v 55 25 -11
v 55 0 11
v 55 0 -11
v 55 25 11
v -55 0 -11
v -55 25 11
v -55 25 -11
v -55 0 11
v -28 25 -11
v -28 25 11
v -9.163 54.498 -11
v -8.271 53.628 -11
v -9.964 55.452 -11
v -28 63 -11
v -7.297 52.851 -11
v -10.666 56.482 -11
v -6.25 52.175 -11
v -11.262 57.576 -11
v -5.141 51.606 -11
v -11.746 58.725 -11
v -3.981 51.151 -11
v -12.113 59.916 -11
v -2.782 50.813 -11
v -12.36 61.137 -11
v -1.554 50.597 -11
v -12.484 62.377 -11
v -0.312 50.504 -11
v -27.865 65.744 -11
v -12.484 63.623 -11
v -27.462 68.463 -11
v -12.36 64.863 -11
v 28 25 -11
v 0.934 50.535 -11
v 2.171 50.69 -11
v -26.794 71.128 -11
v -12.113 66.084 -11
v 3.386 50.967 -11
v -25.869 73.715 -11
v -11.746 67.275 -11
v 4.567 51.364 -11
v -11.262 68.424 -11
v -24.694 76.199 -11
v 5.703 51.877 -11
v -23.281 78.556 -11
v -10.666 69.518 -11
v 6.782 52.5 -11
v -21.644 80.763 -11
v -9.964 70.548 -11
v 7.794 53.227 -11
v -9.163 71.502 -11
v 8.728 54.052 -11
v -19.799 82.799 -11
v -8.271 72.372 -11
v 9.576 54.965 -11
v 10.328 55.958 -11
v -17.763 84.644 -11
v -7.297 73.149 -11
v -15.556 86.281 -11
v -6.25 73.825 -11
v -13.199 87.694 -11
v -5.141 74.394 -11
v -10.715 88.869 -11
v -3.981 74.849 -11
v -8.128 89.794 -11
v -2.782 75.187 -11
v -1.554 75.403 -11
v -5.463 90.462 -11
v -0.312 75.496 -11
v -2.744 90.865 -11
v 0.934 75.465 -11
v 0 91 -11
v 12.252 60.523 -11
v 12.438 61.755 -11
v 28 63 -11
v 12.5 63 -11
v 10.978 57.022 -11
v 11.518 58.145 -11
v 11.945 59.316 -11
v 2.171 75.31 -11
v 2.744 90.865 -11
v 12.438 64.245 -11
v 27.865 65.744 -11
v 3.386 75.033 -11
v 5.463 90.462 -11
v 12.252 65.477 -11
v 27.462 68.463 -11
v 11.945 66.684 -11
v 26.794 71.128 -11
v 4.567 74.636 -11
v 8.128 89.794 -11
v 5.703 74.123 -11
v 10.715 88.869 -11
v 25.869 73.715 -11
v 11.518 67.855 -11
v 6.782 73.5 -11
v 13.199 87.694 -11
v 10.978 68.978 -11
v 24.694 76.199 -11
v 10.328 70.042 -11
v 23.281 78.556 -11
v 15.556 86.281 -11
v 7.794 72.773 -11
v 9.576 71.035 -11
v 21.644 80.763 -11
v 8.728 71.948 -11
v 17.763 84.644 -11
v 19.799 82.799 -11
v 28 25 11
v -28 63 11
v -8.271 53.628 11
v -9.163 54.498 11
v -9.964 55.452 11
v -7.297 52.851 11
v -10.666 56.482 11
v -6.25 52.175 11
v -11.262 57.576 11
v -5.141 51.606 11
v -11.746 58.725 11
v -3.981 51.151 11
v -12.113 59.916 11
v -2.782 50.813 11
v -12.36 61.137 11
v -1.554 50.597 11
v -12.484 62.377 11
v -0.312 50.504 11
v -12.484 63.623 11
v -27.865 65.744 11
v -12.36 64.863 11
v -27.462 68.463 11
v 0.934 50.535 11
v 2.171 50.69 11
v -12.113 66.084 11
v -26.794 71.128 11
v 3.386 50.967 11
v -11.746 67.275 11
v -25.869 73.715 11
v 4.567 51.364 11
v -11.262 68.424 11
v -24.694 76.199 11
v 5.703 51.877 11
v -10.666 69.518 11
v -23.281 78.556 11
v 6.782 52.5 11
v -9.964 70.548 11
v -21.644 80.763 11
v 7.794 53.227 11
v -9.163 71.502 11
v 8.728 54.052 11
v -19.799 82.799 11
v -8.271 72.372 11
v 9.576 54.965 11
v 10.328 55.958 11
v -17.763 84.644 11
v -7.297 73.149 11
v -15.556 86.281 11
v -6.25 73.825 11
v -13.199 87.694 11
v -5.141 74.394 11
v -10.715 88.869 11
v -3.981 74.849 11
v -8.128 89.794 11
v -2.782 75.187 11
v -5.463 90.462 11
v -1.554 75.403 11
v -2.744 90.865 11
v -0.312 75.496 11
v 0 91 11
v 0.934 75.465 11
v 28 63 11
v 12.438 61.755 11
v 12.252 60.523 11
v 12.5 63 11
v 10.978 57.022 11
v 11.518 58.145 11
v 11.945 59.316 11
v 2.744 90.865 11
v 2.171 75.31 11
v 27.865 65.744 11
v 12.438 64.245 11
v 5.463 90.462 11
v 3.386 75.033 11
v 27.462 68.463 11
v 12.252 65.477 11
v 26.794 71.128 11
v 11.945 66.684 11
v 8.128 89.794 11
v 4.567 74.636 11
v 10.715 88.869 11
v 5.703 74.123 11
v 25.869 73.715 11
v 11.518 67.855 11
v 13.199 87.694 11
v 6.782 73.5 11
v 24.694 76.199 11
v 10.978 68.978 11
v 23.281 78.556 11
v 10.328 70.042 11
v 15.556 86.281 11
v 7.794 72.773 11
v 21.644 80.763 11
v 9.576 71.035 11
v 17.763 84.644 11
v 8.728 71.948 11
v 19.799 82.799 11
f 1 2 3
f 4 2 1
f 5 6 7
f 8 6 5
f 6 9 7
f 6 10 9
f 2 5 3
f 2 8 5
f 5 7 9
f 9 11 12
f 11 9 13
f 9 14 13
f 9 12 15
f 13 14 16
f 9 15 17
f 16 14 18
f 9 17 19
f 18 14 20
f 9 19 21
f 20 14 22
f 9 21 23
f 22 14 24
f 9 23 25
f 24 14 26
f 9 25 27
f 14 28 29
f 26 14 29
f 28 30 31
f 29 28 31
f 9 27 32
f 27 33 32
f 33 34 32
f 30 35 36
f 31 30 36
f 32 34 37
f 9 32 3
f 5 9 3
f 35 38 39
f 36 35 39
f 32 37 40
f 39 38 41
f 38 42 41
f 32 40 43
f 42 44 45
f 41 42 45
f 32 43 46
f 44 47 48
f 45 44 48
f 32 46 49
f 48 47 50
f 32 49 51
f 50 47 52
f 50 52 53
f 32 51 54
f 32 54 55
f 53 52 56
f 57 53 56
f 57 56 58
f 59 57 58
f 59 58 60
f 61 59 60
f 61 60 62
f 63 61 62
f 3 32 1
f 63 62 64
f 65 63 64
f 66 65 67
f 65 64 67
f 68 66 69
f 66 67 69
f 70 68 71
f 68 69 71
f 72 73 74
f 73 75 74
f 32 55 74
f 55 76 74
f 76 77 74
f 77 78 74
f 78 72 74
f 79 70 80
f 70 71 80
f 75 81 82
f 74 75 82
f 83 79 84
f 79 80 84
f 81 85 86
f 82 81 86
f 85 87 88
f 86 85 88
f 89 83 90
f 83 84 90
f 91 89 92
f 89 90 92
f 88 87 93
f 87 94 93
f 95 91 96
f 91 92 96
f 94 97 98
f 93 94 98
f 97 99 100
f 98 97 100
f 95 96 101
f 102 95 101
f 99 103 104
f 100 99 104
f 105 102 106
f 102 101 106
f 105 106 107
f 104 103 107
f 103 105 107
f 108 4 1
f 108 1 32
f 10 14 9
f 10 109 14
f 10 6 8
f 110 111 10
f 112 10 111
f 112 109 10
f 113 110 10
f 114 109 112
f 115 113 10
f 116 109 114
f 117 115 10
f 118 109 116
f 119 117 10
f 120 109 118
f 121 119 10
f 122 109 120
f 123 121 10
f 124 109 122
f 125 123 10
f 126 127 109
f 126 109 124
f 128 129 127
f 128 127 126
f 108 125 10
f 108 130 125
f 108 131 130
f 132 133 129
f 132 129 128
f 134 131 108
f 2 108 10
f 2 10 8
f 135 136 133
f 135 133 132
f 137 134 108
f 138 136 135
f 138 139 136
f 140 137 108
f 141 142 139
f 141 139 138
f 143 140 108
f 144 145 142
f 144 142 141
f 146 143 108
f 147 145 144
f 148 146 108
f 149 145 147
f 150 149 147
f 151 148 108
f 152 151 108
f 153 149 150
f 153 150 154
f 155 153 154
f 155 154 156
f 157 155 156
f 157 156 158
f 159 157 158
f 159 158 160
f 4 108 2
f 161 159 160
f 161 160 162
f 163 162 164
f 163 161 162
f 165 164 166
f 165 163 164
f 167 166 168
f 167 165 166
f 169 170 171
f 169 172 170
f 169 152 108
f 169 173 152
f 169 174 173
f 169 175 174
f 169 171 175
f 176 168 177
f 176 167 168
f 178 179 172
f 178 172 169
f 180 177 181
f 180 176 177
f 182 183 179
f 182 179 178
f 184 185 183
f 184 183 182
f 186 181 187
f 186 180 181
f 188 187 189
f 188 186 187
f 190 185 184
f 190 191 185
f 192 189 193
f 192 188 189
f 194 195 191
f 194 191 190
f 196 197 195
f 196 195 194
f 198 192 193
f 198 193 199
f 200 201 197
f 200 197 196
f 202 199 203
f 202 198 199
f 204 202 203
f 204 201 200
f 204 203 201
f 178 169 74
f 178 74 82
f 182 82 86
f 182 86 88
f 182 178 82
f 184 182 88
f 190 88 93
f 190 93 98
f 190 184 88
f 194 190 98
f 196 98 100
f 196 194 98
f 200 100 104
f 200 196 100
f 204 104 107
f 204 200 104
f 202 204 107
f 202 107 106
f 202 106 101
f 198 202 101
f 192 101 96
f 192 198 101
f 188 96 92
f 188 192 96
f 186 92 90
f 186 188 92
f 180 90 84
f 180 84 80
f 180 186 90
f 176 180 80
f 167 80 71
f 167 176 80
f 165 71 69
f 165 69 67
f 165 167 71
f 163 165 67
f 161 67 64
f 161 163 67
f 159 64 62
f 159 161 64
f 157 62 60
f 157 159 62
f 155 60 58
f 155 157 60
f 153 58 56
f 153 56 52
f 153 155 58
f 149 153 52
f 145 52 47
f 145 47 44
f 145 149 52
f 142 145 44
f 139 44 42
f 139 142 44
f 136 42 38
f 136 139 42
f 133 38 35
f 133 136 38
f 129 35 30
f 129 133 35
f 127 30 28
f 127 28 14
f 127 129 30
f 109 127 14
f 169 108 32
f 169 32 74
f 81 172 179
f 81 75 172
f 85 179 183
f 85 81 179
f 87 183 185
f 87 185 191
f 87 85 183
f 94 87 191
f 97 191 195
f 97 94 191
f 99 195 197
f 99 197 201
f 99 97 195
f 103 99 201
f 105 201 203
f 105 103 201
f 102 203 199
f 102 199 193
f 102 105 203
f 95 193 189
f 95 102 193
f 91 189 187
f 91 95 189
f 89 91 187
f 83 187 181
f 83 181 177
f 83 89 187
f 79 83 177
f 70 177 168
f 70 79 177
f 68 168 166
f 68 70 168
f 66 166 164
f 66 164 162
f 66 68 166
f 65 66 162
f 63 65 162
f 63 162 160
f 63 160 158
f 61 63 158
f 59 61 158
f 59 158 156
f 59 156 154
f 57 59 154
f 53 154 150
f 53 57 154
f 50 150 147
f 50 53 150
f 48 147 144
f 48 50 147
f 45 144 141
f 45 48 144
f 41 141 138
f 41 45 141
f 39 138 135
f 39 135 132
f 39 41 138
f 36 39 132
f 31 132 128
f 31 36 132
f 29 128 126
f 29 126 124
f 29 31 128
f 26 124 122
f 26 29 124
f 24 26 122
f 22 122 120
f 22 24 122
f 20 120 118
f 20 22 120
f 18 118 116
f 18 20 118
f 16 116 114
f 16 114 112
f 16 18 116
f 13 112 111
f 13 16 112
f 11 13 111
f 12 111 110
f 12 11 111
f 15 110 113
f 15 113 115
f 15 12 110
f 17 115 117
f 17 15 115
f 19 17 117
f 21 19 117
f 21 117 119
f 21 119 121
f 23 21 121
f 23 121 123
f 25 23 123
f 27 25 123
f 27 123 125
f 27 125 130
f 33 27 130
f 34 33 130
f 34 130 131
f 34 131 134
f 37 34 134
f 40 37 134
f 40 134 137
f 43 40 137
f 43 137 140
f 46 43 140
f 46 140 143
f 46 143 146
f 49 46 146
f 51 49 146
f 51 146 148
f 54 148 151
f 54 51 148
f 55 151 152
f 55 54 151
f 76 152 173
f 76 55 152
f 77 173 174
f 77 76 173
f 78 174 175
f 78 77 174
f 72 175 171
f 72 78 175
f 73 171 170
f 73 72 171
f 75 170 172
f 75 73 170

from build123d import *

# Parameters (mm, degrees)
SKETCH1_R           = 12.5
BOSS_EXTRUDE1_DEPTH = 11


with BuildPart() as part:
    # Sketch1 → Boss-Extrude1 (new, symmetric)
    with BuildSketch(Plane.XY):
        with BuildLine():
            Line((-55, 0), (55, 0))
            Line((55, 0), (55, 25))
            Line((55, 25), (28, 25))
            Line((28, 25), (28, 63))
            ThreePointArc((28, 63), (0, 91), (-28, 63))
            Line((-28, 63), (-28, 25))
            Line((-28, 25), (-55, 25))
            Line((-55, 25), (-55, 0))
        make_face()
        with Locations((0, 63)):
            Circle(SKETCH1_R, mode=Mode.SUBTRACT)
    extrude(amount=BOSS_EXTRUDE1_DEPTH, both=True)


solid = part.part
